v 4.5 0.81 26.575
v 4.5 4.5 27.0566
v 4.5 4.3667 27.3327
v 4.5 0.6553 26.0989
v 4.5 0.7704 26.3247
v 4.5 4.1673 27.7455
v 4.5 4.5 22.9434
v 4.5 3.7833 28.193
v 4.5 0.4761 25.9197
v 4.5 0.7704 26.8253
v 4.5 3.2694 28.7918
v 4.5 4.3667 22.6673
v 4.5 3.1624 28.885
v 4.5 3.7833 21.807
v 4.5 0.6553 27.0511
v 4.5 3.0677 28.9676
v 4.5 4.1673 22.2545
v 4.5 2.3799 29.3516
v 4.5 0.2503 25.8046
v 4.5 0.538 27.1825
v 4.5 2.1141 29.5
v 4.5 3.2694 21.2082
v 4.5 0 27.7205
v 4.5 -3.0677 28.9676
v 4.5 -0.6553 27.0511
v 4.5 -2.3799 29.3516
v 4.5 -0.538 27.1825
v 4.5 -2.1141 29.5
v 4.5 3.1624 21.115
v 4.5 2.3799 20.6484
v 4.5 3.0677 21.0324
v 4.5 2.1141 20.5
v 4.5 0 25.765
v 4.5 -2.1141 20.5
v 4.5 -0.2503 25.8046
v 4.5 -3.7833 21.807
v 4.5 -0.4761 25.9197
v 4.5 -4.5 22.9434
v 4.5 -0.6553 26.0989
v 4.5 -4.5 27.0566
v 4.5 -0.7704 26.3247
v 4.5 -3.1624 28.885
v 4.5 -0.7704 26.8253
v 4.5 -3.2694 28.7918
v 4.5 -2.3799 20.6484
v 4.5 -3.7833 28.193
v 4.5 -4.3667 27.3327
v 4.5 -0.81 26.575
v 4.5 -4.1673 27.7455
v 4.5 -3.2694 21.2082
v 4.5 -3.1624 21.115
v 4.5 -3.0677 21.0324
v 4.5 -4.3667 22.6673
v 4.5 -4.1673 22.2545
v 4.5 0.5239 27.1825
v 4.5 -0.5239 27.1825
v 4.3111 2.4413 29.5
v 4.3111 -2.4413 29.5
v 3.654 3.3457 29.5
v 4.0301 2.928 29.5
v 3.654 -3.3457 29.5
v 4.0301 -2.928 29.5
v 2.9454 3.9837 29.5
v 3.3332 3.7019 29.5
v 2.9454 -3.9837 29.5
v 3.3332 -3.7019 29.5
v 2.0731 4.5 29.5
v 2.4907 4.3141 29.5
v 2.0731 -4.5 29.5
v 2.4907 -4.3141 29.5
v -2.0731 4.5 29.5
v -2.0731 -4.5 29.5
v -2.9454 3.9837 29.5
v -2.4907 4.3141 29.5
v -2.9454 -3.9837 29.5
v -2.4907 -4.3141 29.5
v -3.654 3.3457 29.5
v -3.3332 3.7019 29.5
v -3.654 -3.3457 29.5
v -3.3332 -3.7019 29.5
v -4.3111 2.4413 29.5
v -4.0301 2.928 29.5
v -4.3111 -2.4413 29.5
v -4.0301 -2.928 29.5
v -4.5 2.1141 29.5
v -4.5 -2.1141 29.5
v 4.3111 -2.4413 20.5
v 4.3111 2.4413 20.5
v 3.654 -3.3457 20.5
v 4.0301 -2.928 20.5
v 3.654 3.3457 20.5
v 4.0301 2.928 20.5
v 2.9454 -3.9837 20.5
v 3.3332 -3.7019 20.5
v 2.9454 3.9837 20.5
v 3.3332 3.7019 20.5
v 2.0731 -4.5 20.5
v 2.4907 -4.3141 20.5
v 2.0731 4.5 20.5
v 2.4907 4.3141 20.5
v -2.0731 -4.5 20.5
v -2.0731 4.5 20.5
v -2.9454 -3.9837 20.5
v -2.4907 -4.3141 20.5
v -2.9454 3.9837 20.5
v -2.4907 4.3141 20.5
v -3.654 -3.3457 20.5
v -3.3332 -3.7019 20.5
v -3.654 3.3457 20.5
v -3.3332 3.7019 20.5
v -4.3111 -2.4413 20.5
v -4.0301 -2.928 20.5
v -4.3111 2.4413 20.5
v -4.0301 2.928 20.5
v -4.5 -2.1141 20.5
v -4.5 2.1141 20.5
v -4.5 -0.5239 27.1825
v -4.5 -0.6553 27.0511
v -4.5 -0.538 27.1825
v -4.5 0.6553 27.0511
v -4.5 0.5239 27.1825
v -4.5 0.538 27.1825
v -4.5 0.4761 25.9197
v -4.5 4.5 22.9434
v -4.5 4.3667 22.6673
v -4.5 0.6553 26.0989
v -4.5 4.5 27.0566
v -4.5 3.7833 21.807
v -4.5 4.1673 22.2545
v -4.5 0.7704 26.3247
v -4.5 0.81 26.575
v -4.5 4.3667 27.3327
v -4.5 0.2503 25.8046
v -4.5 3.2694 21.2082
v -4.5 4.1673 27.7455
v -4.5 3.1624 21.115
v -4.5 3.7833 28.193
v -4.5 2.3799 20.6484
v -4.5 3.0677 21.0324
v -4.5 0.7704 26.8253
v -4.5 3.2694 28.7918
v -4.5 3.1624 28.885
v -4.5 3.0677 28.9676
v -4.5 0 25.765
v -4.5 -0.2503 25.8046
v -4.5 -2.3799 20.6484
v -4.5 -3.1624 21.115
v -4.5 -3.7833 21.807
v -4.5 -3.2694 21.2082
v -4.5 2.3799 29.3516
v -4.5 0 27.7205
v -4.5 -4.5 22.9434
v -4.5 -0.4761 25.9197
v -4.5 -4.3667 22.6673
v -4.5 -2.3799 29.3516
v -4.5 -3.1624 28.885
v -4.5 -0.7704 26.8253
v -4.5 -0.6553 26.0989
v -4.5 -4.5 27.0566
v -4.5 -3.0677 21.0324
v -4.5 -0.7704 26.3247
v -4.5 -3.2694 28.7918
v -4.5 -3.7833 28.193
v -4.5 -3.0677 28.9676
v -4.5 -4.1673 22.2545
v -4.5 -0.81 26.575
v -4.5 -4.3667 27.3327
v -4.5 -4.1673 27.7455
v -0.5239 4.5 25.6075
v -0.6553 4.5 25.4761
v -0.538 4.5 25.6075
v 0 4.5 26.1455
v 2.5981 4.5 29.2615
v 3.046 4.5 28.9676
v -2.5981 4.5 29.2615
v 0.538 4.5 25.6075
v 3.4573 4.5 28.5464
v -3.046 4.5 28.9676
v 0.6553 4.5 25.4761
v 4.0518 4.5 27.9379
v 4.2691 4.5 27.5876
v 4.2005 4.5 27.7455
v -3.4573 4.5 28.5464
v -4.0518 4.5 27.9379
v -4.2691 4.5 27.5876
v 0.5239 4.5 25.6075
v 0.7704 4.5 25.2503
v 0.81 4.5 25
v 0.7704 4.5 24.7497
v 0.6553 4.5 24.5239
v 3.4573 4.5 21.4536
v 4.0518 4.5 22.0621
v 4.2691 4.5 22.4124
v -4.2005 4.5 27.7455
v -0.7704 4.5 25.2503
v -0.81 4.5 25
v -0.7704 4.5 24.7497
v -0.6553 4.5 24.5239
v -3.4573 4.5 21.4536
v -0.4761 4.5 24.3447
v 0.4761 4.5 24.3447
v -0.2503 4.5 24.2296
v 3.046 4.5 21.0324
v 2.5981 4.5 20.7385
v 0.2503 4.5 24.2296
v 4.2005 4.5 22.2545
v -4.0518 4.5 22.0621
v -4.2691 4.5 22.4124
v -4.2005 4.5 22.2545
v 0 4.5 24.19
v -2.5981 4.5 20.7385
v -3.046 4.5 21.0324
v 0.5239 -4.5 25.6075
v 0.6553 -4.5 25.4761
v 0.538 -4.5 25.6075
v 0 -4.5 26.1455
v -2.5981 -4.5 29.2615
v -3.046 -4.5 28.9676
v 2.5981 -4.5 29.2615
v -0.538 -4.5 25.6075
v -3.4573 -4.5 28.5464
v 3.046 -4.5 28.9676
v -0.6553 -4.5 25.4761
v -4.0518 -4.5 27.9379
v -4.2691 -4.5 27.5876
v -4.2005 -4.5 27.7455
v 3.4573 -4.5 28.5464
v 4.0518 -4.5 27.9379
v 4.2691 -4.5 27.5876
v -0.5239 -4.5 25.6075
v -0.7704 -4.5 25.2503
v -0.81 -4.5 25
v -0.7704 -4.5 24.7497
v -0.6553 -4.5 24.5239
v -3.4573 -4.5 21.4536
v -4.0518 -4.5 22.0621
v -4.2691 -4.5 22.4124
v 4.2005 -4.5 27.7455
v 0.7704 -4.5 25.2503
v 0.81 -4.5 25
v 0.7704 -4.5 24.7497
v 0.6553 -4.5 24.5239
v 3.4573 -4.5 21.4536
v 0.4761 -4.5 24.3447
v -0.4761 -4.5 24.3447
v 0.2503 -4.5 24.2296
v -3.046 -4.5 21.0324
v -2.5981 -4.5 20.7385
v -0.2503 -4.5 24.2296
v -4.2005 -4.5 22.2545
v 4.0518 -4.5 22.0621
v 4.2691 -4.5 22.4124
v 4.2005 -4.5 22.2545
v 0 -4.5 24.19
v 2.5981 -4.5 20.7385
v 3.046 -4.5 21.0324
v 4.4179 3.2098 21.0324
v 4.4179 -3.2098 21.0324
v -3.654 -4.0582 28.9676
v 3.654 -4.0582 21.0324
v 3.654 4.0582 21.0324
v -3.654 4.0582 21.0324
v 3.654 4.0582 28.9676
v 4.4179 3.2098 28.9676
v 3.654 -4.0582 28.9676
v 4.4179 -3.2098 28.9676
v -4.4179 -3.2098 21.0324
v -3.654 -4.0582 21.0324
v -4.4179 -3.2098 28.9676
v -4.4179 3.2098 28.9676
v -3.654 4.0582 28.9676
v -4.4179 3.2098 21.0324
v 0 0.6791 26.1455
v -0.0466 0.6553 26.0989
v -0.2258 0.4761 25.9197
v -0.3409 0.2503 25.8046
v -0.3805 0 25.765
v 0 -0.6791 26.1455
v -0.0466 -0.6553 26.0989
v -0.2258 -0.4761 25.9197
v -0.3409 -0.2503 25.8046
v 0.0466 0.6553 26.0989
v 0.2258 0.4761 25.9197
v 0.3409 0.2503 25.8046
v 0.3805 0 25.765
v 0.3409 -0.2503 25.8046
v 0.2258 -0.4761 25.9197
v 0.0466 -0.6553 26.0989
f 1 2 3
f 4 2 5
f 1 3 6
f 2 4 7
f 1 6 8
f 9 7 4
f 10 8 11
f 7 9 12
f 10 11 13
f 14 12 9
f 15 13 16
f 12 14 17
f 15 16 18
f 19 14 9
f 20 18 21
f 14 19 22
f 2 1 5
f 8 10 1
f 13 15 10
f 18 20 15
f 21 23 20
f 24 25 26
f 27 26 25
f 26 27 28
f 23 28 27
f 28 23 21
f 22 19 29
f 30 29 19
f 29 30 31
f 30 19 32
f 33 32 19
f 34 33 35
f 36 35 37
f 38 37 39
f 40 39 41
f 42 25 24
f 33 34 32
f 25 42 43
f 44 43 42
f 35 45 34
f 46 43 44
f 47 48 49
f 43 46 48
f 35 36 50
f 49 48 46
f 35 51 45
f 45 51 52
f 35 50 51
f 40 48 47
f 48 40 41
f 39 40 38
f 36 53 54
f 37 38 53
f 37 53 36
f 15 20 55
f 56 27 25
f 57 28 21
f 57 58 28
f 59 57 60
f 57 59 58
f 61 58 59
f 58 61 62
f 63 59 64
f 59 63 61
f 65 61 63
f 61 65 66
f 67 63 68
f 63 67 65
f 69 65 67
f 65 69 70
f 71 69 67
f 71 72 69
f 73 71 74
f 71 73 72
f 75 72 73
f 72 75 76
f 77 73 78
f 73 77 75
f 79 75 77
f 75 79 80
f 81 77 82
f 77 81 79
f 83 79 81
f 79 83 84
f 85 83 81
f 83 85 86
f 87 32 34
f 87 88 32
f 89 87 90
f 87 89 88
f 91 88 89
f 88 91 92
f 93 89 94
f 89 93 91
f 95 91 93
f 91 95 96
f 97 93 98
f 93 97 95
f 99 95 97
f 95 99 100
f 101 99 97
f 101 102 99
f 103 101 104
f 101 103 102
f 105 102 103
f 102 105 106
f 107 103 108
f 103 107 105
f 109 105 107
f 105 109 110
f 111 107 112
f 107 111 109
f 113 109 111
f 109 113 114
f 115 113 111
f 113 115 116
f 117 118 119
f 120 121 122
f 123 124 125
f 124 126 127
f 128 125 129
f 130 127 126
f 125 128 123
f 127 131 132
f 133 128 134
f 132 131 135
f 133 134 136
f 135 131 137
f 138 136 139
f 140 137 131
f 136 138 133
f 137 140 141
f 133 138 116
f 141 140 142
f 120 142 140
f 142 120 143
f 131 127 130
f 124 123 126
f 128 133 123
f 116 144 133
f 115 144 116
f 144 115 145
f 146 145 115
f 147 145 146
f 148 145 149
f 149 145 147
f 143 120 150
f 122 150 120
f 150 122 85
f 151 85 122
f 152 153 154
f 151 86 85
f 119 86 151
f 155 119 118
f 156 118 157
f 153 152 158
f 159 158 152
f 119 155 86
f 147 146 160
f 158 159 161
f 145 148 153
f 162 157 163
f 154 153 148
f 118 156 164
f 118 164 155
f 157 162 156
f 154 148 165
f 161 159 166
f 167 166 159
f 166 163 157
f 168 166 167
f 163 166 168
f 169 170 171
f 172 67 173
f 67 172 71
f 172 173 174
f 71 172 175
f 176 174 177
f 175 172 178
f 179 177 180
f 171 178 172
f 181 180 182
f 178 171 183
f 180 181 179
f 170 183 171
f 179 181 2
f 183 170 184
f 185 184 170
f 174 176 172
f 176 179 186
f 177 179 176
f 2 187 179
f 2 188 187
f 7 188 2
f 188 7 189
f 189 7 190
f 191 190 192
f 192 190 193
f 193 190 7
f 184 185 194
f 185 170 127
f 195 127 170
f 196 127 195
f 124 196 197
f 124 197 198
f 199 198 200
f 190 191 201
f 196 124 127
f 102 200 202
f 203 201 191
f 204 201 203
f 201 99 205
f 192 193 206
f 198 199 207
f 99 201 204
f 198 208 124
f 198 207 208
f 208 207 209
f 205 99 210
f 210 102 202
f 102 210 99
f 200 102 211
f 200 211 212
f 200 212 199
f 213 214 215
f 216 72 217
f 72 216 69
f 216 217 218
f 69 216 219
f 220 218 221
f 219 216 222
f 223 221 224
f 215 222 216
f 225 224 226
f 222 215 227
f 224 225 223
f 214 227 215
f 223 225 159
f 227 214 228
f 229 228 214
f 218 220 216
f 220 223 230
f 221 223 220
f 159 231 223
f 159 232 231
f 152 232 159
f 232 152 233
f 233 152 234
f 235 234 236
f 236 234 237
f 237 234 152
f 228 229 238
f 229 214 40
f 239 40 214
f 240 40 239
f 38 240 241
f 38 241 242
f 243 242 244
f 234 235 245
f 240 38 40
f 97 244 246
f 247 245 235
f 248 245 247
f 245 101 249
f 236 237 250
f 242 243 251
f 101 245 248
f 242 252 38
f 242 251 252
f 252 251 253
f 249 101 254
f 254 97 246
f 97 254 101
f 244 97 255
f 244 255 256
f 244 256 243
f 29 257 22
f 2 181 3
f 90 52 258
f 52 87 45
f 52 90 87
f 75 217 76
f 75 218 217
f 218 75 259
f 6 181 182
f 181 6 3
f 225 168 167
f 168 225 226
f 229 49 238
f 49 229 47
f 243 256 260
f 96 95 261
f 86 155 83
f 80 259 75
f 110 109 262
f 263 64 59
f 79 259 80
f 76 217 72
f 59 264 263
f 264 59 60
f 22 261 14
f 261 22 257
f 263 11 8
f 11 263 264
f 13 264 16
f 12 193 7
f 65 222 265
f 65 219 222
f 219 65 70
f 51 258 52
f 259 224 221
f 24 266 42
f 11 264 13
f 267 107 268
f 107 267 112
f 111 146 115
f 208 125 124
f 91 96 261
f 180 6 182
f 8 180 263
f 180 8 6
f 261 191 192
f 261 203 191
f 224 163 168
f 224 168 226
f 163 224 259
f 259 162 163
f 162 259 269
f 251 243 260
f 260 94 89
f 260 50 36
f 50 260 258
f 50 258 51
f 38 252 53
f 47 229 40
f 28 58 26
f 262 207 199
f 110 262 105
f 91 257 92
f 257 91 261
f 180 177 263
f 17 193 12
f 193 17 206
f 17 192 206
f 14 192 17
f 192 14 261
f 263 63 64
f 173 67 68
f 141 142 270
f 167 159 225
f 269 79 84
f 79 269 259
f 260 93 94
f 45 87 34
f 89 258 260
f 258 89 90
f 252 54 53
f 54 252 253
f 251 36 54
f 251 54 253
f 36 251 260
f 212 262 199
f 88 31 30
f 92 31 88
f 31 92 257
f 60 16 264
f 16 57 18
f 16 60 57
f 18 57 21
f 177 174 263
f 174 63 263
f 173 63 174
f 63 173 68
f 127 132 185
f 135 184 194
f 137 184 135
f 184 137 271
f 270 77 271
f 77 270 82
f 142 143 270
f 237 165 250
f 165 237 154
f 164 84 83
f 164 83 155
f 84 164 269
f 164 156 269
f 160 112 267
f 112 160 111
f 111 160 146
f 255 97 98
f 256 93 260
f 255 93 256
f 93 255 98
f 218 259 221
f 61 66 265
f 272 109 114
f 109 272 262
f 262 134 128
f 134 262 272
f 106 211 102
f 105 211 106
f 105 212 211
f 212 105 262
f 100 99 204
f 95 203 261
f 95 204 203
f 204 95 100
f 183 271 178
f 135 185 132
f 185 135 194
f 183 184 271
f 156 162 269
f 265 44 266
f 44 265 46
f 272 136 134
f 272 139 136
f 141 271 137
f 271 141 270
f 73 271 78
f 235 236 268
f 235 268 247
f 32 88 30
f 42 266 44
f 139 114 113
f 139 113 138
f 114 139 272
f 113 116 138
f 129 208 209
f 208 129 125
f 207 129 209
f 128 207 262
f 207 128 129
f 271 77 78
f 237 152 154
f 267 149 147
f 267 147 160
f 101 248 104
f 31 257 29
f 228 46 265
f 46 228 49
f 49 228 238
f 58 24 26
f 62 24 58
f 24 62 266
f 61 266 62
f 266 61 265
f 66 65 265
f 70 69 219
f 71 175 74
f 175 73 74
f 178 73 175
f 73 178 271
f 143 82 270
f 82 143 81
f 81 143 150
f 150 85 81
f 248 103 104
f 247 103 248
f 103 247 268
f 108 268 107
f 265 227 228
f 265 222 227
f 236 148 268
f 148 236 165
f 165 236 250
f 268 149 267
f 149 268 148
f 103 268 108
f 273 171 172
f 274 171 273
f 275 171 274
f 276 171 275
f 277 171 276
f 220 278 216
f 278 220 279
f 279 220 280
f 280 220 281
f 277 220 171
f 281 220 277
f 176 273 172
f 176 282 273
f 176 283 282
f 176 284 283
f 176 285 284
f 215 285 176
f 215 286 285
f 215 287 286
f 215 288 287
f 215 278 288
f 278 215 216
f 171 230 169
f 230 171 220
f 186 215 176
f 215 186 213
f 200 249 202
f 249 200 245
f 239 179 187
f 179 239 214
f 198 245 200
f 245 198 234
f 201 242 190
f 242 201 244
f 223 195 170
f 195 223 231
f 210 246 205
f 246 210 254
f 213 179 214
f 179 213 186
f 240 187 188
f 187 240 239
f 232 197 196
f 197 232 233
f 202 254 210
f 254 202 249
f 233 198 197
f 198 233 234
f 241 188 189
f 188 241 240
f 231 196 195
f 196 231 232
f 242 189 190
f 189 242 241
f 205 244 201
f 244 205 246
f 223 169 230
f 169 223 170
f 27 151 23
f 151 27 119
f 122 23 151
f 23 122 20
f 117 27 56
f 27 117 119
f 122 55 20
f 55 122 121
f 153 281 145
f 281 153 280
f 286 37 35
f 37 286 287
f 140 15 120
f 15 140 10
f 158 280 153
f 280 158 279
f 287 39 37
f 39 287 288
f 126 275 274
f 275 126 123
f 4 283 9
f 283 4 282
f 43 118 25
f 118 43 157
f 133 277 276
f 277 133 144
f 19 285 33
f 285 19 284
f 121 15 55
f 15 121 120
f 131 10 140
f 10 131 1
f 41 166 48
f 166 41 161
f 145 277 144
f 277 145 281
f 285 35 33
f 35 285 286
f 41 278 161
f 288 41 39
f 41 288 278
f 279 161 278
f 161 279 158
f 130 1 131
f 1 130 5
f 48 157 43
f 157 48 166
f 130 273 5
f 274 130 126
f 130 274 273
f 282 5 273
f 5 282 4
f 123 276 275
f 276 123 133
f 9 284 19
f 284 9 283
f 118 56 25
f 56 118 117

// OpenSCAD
 sc=0.5;
 teardropradius=1.8;
module teardrop(r, h) {
	union(){
		cylinder(h=h,r=r, center = true, $fn=20);
		intersection() {
			rotate(45,[0,0,1]) 
			cube([2*r, 2*r, h], center = true);
			
			translate([1.75*r, 0, 0]) 
			cube([2*r, 2*r, h], center = true);
		}
	}
}

module bracket() {
	difference() {
		difference() {
			cylinder(r=20, h=60, $fn=20);
	
			translate([0,0,45])
			cube([50,20,40], center=true);
	
			translate([25,0,45])
			cube([30,50,40], center=true);
	
			translate([-25,0,45])
			cube([30,50,40], center=true);

			translate([0,0,50])
			rotate(90, [1,0,0])
			rotate(90, [0,0,1])
			teardrop(r= teardropradius, h=60);
	
			translate([20,0,25])
			rotate(90, [1,0,0])
			cylinder(r=10, h=60, center=true);
	
			translate([-20,0,25])
			rotate(90, [1,0,0])
			cylinder(r=10, h=60, center=true);
		}

		translate([0,0,50])
		difference() {
			cube([60,60,50], center=true);

			rotate(90, [1,0,0])
			cylinder(r=10, h=60, center=true);	
			
			translate([0,0,-20])
			cube([60,60,40], center=true);
		}
	}
}

module ball() {
	scale(0.9)
	difference() {
		intersection() {
			cube(size=20, center=true);
			sphere(r=15);
		}

		rotate(90, [1,0,0])
		rotate(90, [0,0,1])	
		teardrop(r=teardropradius, h=30);

		translate([10,0,0])
		rotate(180, [1,0,0])	
		rotate(90, [0,1,0])	
		teardrop(r=teardropradius, h=10);

		translate([-10,0,0])
		rotate(180, [1,0,0])	
		rotate(90, [0,1,0])	
		teardrop(r=teardropradius, h=10);
	}
}
module ballex() {
	scale(0.9)
	difference() {
		intersection() {
			cube(size=20, center=true);
			sphere(r=15);
		}

		rotate(90, [1,0,0])
            rotate(90, [0,0,1])	
                teardrop(r=teardropradius, h=30);


		translate([0,0,3.5])
            rotate(180, [1,0,0])	
                rotate(90, [0,1,0])	
                    teardrop(r=teardropradius, h=30);
	}
}

module motorpin(){
    smi=0.1;
    ch=6;
    d=5.4;
    cux=1;
    cuy=10;
   /* 
    render() difference()
    {
        cylinder(r=d/2,h=ch,$fn=64);
            translate([d/2-cux,-cuy/2,-smi/2]) cube([cux,cuy,ch+smi]);
                translate([-d/2,-cuy/2,-smi/2]) cube([cux,cuy,ch+smi]);
    }*/
    
    linear_extrude(height=8.5,convexity=10) polygon( points=[ [1.5760,-2.3620], [1.0860,-2.6240], [0.5520,-2.7860], [0.0000,-2.8400], [-0.5560,-2.7860], [-1.0880,-2.6240], [-1.5780,-2.3620], [-1.7040,-2.3120], [-1.7040,2.3100], [-1.5780,2.3600], [-1.0880,2.6220], [-0.5560,2.7840], [0.0000,2.8380], [0.5520,2.7840], [1.0860,2.6220], [1.5760,2.3600], [1.7020,2.3100], [1.7020,-2.3120], [1.5760,-2.3620]] );    
}

module joint() {
   
    *difference(){
        bracket();
        translate([0,0,-0.01]) 
            scale(1/sc) //compensate for global scale: pinsize is given
                motorpin();
    }

	translate([0,0,50])
        ballex();

	*rotate(180, [0,1,0])
        rotate(90, [0,0,1])
            translate([0,0,-100])
                bracket();
}




scale(sc) joint();
    
